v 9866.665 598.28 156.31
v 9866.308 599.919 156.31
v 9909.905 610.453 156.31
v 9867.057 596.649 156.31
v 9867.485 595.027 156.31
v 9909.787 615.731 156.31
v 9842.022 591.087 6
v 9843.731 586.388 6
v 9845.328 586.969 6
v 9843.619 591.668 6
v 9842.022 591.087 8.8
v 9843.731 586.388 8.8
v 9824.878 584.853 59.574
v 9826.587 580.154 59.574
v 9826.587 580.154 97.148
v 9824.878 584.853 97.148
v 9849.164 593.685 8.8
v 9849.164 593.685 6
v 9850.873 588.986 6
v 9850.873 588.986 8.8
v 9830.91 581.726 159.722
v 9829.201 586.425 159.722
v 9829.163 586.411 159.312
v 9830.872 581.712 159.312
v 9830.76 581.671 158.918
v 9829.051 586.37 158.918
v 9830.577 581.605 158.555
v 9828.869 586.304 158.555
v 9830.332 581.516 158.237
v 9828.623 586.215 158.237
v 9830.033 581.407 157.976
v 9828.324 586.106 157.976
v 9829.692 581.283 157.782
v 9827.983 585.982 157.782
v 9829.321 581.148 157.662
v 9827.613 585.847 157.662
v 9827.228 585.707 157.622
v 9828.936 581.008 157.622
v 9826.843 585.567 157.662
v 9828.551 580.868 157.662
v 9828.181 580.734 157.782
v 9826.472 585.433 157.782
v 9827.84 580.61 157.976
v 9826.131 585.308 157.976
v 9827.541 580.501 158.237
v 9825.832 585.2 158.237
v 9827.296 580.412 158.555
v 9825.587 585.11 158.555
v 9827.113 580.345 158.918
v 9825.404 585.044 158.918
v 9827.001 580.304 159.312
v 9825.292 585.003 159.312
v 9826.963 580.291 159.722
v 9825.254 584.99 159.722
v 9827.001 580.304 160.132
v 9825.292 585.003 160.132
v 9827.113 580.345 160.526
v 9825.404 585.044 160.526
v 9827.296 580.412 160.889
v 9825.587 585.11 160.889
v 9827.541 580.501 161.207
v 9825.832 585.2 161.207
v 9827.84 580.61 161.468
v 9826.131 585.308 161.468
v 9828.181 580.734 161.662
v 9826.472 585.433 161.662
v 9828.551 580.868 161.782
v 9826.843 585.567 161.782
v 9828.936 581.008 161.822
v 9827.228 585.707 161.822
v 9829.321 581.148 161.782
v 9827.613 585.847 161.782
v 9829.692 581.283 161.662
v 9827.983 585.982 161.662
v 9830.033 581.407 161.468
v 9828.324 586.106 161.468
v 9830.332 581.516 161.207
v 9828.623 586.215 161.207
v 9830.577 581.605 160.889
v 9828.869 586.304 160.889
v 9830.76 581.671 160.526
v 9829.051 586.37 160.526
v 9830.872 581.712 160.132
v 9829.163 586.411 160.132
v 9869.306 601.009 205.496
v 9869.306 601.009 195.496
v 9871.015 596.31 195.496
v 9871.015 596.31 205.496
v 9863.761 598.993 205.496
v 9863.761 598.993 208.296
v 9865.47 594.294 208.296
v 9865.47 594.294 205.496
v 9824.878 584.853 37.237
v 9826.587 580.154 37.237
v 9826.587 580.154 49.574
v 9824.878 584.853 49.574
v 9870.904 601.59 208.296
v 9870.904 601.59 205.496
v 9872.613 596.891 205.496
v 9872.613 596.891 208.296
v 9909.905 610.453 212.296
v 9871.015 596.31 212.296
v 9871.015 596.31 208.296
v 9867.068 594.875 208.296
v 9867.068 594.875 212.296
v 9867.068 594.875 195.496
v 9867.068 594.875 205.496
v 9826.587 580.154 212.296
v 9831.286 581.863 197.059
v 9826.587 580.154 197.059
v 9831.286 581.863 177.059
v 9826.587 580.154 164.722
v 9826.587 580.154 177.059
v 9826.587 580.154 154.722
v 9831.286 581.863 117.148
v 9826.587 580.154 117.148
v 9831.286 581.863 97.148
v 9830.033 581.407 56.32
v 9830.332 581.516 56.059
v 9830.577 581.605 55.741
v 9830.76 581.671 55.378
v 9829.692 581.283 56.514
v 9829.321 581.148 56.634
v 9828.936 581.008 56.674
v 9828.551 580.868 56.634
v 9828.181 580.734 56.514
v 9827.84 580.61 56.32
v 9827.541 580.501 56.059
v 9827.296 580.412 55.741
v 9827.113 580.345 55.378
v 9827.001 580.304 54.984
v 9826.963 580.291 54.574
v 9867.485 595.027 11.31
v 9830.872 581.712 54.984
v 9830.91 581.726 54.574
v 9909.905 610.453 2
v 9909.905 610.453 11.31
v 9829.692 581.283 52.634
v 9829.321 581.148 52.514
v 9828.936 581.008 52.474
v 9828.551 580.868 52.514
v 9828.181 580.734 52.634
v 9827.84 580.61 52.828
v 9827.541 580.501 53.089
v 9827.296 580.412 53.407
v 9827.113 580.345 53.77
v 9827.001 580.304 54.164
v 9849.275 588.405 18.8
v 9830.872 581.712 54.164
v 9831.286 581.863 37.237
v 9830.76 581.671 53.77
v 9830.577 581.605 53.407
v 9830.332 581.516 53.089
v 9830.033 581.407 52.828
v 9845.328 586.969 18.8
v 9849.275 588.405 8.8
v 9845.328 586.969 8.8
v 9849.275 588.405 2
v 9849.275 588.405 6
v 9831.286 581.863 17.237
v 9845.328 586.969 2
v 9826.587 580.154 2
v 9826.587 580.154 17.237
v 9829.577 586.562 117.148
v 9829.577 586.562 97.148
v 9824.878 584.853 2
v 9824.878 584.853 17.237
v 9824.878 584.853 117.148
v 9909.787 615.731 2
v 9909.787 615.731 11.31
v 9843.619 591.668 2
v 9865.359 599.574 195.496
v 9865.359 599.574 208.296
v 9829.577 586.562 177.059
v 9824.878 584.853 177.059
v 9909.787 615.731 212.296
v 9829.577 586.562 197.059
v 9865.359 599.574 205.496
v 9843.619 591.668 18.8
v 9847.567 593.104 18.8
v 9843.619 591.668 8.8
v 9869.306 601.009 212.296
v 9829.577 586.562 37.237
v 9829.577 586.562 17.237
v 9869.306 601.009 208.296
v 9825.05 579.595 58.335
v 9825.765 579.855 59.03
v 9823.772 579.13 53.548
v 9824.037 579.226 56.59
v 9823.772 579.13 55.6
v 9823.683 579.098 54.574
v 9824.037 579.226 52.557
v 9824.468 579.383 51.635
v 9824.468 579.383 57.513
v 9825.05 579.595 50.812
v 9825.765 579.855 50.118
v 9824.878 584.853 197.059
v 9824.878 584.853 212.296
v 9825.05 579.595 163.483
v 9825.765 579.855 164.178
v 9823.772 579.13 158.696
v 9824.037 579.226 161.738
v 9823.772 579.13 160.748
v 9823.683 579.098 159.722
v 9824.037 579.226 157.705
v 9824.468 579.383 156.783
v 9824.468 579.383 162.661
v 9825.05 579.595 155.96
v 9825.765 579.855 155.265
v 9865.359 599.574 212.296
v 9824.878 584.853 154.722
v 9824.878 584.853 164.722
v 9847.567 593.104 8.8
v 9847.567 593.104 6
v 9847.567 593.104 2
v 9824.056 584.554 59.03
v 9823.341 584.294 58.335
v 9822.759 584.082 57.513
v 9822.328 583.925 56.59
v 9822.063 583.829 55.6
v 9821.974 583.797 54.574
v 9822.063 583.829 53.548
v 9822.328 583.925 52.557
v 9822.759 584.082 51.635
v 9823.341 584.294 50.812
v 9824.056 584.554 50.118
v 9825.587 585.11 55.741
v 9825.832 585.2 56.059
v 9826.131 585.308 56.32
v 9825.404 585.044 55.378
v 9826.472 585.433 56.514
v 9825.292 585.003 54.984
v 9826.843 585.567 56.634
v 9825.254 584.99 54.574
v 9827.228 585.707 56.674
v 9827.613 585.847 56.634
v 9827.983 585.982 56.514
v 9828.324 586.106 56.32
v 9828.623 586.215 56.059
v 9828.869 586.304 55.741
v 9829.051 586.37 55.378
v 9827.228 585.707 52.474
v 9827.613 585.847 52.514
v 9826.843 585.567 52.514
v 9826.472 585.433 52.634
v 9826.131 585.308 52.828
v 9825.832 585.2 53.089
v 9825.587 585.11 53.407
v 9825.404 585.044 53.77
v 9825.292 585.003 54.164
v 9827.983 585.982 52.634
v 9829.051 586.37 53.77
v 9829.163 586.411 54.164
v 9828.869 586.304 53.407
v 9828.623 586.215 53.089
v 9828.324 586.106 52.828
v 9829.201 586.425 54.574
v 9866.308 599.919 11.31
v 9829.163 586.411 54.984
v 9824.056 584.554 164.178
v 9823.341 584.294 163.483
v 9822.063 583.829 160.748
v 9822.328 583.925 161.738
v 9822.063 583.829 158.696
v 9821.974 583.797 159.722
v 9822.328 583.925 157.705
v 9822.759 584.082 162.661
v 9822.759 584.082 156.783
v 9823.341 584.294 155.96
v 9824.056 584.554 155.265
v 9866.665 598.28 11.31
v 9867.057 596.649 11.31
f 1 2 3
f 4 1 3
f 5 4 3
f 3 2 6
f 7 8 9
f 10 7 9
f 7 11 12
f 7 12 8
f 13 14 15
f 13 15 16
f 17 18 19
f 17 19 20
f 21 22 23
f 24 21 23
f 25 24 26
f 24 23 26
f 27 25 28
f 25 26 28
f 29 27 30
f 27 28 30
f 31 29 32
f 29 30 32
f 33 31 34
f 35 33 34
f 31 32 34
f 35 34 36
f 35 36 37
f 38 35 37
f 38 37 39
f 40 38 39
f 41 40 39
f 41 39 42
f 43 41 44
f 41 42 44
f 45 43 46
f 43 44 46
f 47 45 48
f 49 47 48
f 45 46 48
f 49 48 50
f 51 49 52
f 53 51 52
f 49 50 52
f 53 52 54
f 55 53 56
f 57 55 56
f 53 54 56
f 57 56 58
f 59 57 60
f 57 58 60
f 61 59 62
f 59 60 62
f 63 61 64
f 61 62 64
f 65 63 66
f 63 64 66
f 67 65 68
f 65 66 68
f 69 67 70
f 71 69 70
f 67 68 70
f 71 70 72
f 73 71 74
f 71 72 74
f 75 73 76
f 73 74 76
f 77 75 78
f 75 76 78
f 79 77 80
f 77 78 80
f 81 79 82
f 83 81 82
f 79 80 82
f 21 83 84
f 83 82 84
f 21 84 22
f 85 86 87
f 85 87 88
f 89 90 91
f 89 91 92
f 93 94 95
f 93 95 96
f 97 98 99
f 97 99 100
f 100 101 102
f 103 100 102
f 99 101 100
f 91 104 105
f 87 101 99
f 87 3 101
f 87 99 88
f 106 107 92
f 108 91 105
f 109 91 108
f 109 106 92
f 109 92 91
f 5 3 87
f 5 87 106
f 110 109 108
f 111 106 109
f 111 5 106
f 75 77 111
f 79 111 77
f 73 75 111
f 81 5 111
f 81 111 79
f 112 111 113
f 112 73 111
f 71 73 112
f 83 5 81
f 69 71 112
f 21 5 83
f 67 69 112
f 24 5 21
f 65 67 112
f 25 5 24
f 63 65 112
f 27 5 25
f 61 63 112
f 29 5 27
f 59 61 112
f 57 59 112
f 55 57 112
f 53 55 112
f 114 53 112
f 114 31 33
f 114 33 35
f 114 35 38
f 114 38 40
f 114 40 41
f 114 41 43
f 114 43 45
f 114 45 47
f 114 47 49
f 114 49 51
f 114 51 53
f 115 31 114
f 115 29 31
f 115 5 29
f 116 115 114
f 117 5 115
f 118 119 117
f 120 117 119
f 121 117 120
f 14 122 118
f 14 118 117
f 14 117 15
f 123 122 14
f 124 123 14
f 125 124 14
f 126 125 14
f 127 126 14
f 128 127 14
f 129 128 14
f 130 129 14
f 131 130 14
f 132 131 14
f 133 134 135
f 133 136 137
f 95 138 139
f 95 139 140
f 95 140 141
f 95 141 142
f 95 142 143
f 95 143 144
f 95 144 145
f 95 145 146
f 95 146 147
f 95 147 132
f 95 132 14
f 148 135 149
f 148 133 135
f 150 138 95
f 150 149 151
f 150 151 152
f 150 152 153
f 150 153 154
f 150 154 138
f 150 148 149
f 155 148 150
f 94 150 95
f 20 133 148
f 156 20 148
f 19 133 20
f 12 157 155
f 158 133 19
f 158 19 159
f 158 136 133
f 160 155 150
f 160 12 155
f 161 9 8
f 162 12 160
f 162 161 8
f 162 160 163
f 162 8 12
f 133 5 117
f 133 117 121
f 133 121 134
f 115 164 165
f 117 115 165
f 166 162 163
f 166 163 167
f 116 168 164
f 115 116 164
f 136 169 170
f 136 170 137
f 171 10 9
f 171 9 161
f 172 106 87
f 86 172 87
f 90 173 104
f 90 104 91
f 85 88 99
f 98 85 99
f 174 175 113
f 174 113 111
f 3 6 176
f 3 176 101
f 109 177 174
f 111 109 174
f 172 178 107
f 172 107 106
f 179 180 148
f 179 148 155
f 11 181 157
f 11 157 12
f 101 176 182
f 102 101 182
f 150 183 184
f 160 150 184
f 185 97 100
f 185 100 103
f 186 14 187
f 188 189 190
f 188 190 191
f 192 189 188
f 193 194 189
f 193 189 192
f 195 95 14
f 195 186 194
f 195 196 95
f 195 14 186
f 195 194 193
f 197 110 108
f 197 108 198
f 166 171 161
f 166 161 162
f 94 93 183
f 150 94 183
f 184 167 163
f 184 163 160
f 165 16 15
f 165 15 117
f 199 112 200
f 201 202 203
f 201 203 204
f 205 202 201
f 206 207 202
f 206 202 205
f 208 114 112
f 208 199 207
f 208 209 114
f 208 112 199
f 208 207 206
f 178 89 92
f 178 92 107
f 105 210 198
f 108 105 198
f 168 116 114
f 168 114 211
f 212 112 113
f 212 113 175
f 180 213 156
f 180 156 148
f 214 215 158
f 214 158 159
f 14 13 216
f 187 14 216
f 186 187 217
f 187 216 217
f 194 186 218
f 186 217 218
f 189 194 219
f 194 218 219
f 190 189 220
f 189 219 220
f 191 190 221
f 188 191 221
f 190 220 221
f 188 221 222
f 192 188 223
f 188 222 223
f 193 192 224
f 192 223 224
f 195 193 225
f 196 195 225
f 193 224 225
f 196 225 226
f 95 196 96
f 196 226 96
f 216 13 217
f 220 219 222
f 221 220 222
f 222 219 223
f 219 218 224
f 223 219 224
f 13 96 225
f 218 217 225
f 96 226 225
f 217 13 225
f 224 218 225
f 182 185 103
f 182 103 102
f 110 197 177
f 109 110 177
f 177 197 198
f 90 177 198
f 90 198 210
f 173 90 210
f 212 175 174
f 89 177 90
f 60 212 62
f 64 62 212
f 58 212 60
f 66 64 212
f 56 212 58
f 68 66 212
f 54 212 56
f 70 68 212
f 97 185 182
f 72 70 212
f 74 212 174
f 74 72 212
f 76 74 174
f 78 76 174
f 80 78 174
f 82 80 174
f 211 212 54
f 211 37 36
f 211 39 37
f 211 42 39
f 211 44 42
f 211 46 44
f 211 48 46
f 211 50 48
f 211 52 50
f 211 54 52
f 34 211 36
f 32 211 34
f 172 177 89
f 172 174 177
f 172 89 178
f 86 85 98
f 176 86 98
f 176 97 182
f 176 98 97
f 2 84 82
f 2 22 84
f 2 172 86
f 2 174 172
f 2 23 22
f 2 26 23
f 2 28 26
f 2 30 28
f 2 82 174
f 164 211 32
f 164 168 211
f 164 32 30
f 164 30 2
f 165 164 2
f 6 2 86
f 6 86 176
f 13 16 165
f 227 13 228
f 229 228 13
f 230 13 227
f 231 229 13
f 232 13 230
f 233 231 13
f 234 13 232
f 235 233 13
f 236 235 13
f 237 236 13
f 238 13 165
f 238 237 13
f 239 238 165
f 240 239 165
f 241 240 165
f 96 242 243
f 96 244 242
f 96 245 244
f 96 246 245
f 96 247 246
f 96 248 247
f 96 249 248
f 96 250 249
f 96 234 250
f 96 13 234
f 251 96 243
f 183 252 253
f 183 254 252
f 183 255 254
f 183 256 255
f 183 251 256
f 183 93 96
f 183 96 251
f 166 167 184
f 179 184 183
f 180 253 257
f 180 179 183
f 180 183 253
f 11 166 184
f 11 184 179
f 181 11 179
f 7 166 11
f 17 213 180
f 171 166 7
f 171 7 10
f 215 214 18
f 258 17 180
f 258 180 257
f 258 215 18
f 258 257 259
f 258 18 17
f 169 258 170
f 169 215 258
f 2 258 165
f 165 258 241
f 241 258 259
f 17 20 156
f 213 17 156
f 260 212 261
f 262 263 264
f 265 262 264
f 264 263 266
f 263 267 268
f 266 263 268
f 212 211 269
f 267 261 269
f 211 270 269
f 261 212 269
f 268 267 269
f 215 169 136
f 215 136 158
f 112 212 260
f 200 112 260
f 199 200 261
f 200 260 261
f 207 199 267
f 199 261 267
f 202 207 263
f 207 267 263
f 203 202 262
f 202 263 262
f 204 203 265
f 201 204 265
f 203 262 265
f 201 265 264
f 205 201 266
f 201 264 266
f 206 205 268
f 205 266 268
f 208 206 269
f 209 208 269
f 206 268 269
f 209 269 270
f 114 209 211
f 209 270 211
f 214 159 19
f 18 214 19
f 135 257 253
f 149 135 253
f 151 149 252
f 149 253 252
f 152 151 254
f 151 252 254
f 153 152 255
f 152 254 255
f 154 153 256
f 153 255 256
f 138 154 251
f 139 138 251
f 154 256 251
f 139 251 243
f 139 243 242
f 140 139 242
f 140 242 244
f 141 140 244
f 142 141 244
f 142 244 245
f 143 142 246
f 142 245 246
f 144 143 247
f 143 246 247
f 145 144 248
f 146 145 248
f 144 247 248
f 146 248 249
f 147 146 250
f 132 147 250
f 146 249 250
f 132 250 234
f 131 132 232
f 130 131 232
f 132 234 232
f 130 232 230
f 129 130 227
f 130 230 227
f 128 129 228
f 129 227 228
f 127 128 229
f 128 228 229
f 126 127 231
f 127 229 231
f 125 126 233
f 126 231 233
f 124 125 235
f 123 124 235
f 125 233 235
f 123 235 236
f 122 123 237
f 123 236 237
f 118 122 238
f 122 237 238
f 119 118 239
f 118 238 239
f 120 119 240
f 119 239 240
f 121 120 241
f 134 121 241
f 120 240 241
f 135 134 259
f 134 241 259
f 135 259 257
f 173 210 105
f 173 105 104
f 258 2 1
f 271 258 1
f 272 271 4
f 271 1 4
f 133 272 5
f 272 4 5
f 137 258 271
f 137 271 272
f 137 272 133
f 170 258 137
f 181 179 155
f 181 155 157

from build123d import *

# Parameters (mm, degrees)
BOSS_EXTRUDE1_DEPTH = 210.295833
SKETCH3_R           = 77.5
CUT_EXTRUDE1_DEPTH  = 145
SKETCH5_R           = 2.1
SKETCH5_W           = 5
SKETCH5_H           = 20
CUT_EXTRUDE2_DEPTH  = 5
BOSS_EXTRUDE3_DEPTH = 5


with BuildPart() as part:
    # Sketch2 → Boss-Extrude1 (new body)
    with BuildSketch(Plane.XY.offset(2)):
        Polygon((9824.878184466, 584.85282122), (9909.787083107, 615.730562883), (9909.90527281, 610.4531895), (9826.586986711, 580.153885714), align=None)
    extrude(amount=BOSS_EXTRUDE1_DEPTH)

    # Sketch3 → Cut-Extrude1 (cut)
    with BuildSketch(Plane.XY.offset(156.31)):
        with Locations((9942.206448078, 615.592583846)):
            Circle(SKETCH3_R)
    extrude(amount=-CUT_EXTRUDE1_DEPTH, mode=Mode.SUBTRACT)

    # Sketch5 → Cut-Extrude2 (cut)
    with BuildSketch(Plane(origin=(959.703546547, -2639.032739095, 0), x_dir=(0.939787101, 0.341760449, 0), z_dir=(-0.341760449, 0.939787101, 0))):
        with Locations((9435.67335083, -159.721874806)):
            Circle(SKETCH5_R)
        with Locations((9435.67335083, -54.573958269)):
            Circle(SKETCH5_R)
        Polygon((9480.447890116, -212.295833075), (9476.247890116, -212.295833075), (9476.247890116, -208.295833075), (9474.547890116, -208.295833075), (9474.547890116, -205.495833075), (9476.247890116, -205.495833075), (9476.247890116, -195.495833075), (9480.447890116, -195.495833075), (9480.447890116, -205.495833075), (9482.147890116, -205.495833075), (9482.147890116, -208.295833075), (9480.447890116, -208.295833075), align=None)
        with Locations((9435.67335083, -187.058853941)):
            Rectangle(SKETCH5_W, SKETCH5_H)
        with Locations((9435.67335083, -107.147916538)):
            Rectangle(SKETCH5_W, SKETCH5_H)
        with Locations((9435.67335083, -27.236979134)):
            Rectangle(SKETCH5_W, SKETCH5_H)
        Polygon((9453.115424439, -2), (9457.315424439, -2), (9457.315424439, -6), (9459.015424439, -6), (9459.015424439, -8.8), (9457.315424439, -8.8), (9457.315424439, -18.8), (9453.115424439, -18.8), (9453.115424439, -8.8), (9451.415424439, -8.8), (9451.415424439, -6), (9453.115424439, -6), align=None)
    extrude(amount=-CUT_EXTRUDE2_DEPTH, mode=Mode.SUBTRACT)

    # Sketch7 → Boss-Extrude3 (add)
    with BuildSketch(Plane(origin=(959.703546547, -2639.032739095, 0), x_dir=(0.939787101, 0.341760449, 0), z_dir=(-0.341760449, 0.939787101, 0))):
        with BuildLine():
            Line((9433.17335083, -49.573958269), (9433.17335083, -59.573958269))
            ThreePointArc((9433.17335083, -59.573958269), (9430.083180886, -54.573958269), (9433.17335083, -49.573958269))
        make_face()
        with BuildLine():
            Line((9433.17335083, -154.721874806), (9433.17335083, -164.721874806))
            ThreePointArc((9433.17335083, -164.721874806), (9430.083180886, -159.721874806), (9433.17335083, -154.721874806))
        make_face()
    extrude(amount=-BOSS_EXTRUDE3_DEPTH)


solid = part.part
